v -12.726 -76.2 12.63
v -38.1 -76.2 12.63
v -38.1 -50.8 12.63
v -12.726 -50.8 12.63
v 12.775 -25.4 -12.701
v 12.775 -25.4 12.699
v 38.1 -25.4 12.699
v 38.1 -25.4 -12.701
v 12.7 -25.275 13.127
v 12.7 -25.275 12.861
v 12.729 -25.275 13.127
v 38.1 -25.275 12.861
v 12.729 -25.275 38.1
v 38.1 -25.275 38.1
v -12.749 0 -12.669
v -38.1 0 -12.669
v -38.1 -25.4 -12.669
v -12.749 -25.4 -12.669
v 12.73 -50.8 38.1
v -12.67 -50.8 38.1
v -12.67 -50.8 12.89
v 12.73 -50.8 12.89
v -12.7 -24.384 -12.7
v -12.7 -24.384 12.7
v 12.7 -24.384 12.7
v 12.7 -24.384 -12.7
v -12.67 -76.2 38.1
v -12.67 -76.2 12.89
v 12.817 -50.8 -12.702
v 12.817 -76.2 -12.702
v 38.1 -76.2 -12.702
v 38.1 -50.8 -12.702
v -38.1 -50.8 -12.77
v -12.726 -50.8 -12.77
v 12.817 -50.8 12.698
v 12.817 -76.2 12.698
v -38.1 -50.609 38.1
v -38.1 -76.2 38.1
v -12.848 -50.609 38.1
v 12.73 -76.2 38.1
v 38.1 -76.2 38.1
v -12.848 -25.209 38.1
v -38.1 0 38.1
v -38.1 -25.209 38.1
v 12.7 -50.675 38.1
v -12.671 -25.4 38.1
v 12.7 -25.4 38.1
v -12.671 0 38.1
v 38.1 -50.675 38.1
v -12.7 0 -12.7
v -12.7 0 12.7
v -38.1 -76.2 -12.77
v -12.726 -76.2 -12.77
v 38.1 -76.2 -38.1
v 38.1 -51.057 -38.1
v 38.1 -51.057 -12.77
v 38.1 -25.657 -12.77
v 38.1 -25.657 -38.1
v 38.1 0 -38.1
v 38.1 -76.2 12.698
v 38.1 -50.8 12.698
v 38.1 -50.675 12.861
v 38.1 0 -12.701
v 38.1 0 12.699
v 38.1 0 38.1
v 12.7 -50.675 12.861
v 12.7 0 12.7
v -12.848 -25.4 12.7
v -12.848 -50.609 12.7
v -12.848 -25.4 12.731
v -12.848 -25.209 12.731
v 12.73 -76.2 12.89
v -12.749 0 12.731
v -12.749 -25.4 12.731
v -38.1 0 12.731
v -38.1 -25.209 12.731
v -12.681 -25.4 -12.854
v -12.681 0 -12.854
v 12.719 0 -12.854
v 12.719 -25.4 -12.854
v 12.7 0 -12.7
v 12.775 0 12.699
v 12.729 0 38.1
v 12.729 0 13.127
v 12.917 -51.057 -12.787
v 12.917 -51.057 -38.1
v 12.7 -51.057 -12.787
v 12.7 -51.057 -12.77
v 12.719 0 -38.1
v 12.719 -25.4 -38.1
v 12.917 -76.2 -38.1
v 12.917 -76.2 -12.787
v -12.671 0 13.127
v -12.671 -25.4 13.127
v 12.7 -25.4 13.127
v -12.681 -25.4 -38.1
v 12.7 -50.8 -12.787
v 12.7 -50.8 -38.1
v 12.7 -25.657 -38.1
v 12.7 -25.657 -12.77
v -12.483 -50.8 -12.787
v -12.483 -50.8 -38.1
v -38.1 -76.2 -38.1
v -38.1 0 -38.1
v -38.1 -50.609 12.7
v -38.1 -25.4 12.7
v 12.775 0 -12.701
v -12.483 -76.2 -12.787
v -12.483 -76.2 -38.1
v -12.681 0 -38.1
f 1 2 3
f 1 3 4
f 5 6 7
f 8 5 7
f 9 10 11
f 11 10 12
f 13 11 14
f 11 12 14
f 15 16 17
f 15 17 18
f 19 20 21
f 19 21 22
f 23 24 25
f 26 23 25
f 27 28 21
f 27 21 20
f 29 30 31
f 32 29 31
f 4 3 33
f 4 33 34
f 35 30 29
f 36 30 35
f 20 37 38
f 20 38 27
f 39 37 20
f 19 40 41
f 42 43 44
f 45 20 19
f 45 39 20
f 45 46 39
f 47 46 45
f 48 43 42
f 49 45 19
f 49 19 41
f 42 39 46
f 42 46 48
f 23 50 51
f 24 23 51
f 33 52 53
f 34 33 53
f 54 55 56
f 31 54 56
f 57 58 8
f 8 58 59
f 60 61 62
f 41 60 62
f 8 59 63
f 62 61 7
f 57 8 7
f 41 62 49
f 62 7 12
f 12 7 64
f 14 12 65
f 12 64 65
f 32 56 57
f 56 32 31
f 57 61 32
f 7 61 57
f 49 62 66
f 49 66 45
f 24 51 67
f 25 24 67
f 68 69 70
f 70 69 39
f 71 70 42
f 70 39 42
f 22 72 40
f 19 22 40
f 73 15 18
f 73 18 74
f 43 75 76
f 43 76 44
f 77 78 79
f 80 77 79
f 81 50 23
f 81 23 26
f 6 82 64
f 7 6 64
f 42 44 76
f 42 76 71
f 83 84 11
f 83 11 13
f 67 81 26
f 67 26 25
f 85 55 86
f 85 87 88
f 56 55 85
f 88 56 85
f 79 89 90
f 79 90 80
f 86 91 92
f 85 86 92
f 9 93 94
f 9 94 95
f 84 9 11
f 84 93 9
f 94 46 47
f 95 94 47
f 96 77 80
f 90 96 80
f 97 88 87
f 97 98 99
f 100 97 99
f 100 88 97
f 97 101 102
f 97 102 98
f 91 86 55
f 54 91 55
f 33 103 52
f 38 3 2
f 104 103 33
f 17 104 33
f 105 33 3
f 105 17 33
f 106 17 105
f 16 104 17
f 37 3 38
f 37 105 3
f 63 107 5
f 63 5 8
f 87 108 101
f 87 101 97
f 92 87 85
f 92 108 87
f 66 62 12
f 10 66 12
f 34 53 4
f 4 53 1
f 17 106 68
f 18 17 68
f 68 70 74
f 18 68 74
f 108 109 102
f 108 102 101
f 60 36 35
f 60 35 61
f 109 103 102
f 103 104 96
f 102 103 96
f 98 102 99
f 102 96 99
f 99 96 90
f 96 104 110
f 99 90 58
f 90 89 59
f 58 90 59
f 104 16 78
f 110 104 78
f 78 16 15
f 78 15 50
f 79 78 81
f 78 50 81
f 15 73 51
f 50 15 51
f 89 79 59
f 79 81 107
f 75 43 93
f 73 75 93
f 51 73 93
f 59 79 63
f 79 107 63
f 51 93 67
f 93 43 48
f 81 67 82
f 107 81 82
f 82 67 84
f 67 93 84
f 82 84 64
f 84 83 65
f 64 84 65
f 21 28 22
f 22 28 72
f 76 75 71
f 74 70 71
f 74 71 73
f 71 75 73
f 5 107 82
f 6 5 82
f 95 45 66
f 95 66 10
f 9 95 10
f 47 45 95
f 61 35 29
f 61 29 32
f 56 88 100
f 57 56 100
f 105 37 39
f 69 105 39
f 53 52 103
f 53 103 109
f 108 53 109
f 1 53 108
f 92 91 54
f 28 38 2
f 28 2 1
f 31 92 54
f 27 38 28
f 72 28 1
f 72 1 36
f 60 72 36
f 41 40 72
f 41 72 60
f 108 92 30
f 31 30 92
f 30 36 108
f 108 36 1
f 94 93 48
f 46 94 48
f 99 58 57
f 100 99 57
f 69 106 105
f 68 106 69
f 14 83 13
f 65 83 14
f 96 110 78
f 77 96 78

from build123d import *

# Parameters (mm, degrees)
F0_W      = 76.2
F0_H      = 76.2
F1_DEPTH  = 76.2
F3_W      = 25.4
F3_H      = 25.4
F4_W      = 25.4
F4_H      = 25.4
F5_W      = 25.4
F5_H      = 25.4
F6_W      = 25.4
F6_H      = 25.4
F7_DEPTH  = 25.4
F14_W     = 25.4
F14_H     = 25.4
F13_W     = 25.4
F13_H     = 25.4
F12_W     = 25.4
F12_H     = 25.4
F11_W     = 25.4
F11_H     = 25.4
F15_DEPTH = 25.4
F16_W     = 25.4
F16_H     = 25.4
F17_W     = 25.4
F17_H     = 25.4
F18_DEPTH = 25.4
F20_W     = 25.4
F20_H     = 25.4
F21_DEPTH = 25.4
F2_W      = 25.4
F2_H      = 25.4
F22_DEPTH = 24.384


with BuildPart() as f1:
    # F0 (on Front) → F1 (new body)
    with BuildSketch(Plane.XZ):
        Rectangle(F0_W, F0_H)
    extrude(amount=F1_DEPTH)

    # F3 (on Front) + F4 (on Front) + F5 (on Front) + F6 (on Front) → F7 (cut)
    with BuildSketch(Plane.XZ):
        with Locations((-25.449485, 0.03107)):
            Rectangle(F3_W, F3_H)
    with BuildSketch(Plane.XZ):
        with Locations((0.029016, 25.827004)):
            Rectangle(F4_W, F4_H)
    with BuildSketch(Plane.XZ):
        with Locations((25.474846, -0.000868)):
            Rectangle(F5_W, F5_H)
    with BuildSketch(Plane.XZ):
        with Locations((0.018974, -25.553884)):
            Rectangle(F6_W, F6_H)
    extrude(amount=F7_DEPTH, mode=Mode.SUBTRACT)

    # F14 (on offset) + F13 (on offset) + F12 (on offset) + F11 (on offset) → F15 (cut)
    with BuildSketch(Plane.XZ.offset(76.2)):
        with Locations((-25.426297, -0.069618)):
            Rectangle(F14_W, F14_H)
    with BuildSketch(Plane.XZ.offset(76.2)):
        with Locations((0.216928, -25.486759)):
            Rectangle(F13_W, F13_H)
    with BuildSketch(Plane.XZ.offset(76.2)):
        with Locations((25.516777, -0.001813)):
            Rectangle(F12_W, F12_H)
    with BuildSketch(Plane.XZ.offset(76.2)):
        with Locations((0.029588, 25.589703)):
            Rectangle(F11_W, F11_H)
    extrude(amount=-F15_DEPTH, mode=Mode.SUBTRACT)

    # F16 (on offset) + F17 (on offset) → F18 (cut)
    with BuildSketch(Plane.YZ.offset(38.1)):
        with Locations((-37.974666, 25.560617)):
            Rectangle(F16_W, F16_H)
    with BuildSketch(Plane.YZ.offset(38.1)):
        with Locations((-38.356981, -25.470397)):
            Rectangle(F17_W, F17_H)
    extrude(amount=-F18_DEPTH, mode=Mode.SUBTRACT)

    # F20 (on offset) → F21 (cut)
    with BuildSketch(Plane.XY.offset(38.1)):
        with Locations((-25.548159, -37.909492)):
            Rectangle(F20_W, F20_H)
    extrude(amount=-F21_DEPTH, mode=Mode.SUBTRACT)

    # F2 (on Front) → F22 (cut)
    with BuildSketch(Plane.XZ):
        Rectangle(F2_W, F2_H)
    extrude(amount=F22_DEPTH, mode=Mode.SUBTRACT)


solid = f1.part
